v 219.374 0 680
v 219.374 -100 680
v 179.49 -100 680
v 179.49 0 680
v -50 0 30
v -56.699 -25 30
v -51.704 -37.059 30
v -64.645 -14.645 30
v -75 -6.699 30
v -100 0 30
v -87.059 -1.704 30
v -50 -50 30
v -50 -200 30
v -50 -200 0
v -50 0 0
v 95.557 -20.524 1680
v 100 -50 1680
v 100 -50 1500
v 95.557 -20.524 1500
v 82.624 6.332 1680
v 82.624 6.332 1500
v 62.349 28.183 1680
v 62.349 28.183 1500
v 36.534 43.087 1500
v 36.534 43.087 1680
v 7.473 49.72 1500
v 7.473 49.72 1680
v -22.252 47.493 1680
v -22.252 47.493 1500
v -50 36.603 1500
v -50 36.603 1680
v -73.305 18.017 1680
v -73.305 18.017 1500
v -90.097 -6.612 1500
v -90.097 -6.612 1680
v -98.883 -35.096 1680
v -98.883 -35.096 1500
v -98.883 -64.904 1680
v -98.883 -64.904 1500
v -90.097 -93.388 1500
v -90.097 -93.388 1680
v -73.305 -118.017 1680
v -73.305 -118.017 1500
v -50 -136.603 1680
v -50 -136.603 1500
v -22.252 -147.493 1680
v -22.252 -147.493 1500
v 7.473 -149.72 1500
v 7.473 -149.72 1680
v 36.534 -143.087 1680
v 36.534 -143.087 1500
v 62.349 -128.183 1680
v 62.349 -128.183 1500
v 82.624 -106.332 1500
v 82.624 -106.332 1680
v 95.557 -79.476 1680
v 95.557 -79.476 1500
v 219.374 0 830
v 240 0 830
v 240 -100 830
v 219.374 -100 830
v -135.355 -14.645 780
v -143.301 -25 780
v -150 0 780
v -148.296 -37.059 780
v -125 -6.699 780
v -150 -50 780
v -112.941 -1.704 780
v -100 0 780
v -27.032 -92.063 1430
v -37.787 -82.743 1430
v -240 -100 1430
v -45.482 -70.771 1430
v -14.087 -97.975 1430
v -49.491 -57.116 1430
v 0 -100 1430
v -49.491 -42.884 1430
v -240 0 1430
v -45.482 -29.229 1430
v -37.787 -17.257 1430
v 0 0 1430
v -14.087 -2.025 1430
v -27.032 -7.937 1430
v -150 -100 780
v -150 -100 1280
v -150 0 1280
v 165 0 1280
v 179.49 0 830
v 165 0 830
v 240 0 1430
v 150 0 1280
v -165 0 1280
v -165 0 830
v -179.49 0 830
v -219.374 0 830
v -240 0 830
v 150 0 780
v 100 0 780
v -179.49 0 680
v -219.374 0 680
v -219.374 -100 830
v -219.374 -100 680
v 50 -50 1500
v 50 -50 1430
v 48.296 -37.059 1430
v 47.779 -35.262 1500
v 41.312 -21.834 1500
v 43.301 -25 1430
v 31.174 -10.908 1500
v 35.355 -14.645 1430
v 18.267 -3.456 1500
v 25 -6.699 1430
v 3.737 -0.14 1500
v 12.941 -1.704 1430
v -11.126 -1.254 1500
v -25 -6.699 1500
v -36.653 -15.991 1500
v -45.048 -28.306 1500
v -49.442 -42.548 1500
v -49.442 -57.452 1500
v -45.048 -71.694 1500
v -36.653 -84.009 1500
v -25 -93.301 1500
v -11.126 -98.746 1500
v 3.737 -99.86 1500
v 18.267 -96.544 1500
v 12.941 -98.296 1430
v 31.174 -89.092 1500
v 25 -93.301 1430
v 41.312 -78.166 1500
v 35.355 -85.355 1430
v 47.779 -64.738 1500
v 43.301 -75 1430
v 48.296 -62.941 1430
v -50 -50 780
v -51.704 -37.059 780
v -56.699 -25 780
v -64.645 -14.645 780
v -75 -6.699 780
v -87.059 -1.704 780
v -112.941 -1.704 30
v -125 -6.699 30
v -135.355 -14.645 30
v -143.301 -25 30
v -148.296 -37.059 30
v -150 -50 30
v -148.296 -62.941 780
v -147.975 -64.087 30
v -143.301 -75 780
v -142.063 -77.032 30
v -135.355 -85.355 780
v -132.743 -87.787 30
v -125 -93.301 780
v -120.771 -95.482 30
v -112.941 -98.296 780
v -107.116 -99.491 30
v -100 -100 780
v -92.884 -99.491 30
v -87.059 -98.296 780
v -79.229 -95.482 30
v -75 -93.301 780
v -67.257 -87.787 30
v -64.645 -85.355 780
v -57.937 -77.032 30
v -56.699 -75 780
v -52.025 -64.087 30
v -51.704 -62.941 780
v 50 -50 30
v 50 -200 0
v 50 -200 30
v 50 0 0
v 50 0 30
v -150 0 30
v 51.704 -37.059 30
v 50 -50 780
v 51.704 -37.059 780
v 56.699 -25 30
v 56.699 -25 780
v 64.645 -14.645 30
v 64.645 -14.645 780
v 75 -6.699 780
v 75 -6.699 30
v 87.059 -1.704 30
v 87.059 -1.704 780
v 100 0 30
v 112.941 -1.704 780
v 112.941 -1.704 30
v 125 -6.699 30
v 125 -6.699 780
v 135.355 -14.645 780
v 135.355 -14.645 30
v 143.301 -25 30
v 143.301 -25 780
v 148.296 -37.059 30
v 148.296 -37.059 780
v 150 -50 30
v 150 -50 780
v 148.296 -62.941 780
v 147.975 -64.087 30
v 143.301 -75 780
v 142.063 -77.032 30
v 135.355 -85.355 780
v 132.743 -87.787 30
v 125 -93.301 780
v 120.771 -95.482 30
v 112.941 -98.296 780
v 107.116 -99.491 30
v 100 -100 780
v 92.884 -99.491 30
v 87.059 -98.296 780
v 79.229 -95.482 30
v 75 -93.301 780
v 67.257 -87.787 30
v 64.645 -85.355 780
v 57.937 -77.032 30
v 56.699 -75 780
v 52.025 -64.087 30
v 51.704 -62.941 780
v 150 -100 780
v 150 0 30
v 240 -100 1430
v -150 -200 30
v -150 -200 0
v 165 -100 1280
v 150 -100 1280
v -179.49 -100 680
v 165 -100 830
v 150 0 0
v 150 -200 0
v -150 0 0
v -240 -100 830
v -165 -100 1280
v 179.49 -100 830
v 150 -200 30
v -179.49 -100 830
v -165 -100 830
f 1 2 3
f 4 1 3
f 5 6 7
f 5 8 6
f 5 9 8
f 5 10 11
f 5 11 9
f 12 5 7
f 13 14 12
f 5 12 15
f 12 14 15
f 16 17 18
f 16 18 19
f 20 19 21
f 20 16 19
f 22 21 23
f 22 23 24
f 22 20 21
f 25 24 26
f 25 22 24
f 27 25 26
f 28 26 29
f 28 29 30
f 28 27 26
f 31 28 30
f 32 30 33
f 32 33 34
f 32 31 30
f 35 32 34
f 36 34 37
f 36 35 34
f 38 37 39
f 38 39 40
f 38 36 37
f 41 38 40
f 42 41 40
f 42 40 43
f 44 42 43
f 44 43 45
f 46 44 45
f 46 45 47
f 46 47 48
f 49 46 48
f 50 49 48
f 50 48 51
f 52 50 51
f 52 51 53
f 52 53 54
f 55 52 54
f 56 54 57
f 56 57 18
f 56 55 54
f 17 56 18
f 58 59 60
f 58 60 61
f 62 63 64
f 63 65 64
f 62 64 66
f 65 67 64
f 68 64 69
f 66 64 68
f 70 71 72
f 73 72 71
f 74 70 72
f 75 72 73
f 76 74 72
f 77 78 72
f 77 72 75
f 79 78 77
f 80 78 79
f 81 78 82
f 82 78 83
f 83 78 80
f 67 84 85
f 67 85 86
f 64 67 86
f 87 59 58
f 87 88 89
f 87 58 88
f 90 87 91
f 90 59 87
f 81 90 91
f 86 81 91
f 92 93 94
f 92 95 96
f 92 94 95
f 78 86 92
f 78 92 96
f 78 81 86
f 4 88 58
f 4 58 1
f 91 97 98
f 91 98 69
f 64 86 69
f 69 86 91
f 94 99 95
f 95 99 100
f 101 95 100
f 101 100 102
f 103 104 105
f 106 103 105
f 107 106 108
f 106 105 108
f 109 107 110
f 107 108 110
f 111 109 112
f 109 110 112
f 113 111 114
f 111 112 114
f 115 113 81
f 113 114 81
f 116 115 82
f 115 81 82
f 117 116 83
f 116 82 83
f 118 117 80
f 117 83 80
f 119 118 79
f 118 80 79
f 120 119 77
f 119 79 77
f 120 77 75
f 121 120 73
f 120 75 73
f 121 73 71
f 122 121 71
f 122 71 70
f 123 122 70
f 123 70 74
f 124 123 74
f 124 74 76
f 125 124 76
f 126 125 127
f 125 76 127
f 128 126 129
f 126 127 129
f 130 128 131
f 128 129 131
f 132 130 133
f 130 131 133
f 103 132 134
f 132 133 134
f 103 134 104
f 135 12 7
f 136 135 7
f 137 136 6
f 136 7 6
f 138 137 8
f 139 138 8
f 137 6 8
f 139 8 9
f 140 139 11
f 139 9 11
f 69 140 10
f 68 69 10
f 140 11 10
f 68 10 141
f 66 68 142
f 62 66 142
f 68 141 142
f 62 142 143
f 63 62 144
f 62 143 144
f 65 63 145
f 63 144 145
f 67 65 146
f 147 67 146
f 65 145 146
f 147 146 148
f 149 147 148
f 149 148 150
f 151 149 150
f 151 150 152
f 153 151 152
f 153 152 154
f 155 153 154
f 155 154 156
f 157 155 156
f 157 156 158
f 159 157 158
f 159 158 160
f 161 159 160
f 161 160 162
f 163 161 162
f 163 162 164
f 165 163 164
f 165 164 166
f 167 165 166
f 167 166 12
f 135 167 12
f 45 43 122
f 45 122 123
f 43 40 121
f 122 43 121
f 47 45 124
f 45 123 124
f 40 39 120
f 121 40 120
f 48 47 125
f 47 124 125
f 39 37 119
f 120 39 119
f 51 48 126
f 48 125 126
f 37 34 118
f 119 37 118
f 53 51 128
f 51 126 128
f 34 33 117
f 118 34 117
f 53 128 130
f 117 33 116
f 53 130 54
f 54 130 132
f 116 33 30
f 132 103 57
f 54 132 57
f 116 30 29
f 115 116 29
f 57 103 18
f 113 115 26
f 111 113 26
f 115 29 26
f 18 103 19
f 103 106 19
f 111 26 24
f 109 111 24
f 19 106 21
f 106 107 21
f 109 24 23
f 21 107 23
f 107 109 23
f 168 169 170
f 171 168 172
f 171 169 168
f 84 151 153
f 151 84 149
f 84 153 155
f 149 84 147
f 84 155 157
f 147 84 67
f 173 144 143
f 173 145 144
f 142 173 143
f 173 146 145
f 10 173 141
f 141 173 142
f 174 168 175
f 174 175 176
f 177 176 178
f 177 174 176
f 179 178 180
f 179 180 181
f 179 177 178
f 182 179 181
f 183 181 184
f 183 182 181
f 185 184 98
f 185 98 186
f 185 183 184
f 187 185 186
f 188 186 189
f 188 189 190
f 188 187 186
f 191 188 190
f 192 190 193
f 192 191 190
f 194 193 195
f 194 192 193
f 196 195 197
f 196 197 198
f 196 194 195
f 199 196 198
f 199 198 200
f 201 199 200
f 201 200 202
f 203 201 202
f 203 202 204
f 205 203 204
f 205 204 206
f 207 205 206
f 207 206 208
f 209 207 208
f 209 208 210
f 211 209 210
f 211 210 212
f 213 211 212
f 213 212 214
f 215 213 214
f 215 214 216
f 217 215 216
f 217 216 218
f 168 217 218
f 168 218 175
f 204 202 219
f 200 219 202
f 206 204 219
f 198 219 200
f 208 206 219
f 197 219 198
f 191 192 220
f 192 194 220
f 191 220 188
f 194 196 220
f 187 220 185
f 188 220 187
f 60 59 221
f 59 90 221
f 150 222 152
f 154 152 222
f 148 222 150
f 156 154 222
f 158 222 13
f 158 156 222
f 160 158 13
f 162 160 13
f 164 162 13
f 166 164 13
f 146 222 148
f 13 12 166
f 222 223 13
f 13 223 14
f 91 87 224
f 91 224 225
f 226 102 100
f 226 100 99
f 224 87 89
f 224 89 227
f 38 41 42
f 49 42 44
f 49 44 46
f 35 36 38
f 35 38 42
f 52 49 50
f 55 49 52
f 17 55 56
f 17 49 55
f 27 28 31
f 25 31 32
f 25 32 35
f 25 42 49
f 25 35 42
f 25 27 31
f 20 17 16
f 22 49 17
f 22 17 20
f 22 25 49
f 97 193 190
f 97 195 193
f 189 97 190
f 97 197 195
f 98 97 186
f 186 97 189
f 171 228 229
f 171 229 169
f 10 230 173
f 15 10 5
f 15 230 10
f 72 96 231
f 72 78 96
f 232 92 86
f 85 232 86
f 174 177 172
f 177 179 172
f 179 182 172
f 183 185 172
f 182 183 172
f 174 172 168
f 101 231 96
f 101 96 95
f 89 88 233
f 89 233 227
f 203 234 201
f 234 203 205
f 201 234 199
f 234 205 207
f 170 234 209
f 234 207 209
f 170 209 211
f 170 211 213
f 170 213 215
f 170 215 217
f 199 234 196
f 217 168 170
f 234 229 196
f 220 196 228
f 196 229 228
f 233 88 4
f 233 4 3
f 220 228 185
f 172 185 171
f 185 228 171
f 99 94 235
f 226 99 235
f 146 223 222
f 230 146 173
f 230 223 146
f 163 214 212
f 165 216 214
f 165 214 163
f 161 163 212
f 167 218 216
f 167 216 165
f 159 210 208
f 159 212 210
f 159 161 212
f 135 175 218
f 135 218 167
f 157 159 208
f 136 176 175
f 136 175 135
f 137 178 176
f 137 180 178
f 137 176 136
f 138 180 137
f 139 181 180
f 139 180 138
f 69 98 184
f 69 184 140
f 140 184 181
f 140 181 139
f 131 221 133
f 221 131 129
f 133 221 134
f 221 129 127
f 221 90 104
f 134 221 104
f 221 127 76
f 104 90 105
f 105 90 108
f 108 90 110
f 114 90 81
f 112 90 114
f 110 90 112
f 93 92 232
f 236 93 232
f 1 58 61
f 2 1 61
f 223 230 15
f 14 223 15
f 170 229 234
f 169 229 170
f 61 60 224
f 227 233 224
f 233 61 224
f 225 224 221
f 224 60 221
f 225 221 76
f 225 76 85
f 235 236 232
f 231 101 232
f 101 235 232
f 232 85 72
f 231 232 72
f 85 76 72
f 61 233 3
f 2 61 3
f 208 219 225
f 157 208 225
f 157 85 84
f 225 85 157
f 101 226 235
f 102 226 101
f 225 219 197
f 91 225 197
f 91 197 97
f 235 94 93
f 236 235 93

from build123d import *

# Parameters (mm, degrees)
F0_W      = 100
F0_H      = 200
F1_DEPTH  = 30
F2_R      = 50
F3_DEPTH  = 750
F4_W      = 150
F4_H      = 100
F5_DEPTH  = 650
F6_R      = 50
F7_DEPTH  = 250
F8_W      = 240
F8_H      = 100
F9_DEPTH  = 150
F10_W     = 75
F10_H     = 100
F11_DEPTH = 450
F12_W     = 39.883688
F12_H     = 100
F13_DEPTH = 150
F15_R     = 100
F16_DEPTH = 180


with BuildPart() as f1:
    # F0 (on Top) → F1 (new body)
    with BuildSketch(Plane.XY):
        with Locations((-100, -100)):
            Rectangle(F0_W, F0_H)
    extrude(amount=F1_DEPTH)

    # F2 (on face) → F3 (join)
    with BuildSketch(Plane.XY.offset(30)):
        with Locations((-100, -50)):
            Circle(F2_R)
    extrude(amount=F3_DEPTH)

    # F4 (on face) → F5 (join)
    with BuildSketch(Plane.XY.offset(780)):
        with Locations((-75, -50)):
            Rectangle(F4_W, F4_H)
    extrude(amount=F5_DEPTH)

    # F6 (on face) → F7 (join)
    with BuildSketch(Plane.XY.offset(1430)):
        with Locations((0, -50)):
            Circle(F6_R)
    extrude(amount=F7_DEPTH)

    # F8 (on face) → F9 (join)
    with BuildSketch(Plane.XY.offset(1430)):
        with Locations((-120, -50)):
            Rectangle(F8_W, F8_H)
    extrude(amount=-F9_DEPTH)

    # F10 (on face) → F11 (join)
    with BuildSketch(Plane(origin=(0, 0, 1280), x_dir=(1, 0, 0), z_dir=(0, 0, -1))):
        with Locations((-202.5, 50)):
            Rectangle(F10_W, F10_H)
    extrude(amount=F11_DEPTH)

    # F12 (on face) → F13 (join)
    with BuildSketch(Plane(origin=(0, 0, 830), x_dir=(1, 0, 0), z_dir=(0, 0, -1))):
        with Locations((-199.432023, 50)):
            Rectangle(F12_W, F12_H)
    extrude(amount=F13_DEPTH)

    # F14: F1 across plane


with BuildPart() as f1_1:
    add(f1.part)
    add(f1.part.mirror(Plane.YZ))

    # F15 (on face) → F16 (join)
    with BuildSketch(Plane.XY.offset(1680)):
        with Locations((0, -50)):
            Circle(F15_R)
    extrude(amount=-F16_DEPTH)


solid = f1_1.part
